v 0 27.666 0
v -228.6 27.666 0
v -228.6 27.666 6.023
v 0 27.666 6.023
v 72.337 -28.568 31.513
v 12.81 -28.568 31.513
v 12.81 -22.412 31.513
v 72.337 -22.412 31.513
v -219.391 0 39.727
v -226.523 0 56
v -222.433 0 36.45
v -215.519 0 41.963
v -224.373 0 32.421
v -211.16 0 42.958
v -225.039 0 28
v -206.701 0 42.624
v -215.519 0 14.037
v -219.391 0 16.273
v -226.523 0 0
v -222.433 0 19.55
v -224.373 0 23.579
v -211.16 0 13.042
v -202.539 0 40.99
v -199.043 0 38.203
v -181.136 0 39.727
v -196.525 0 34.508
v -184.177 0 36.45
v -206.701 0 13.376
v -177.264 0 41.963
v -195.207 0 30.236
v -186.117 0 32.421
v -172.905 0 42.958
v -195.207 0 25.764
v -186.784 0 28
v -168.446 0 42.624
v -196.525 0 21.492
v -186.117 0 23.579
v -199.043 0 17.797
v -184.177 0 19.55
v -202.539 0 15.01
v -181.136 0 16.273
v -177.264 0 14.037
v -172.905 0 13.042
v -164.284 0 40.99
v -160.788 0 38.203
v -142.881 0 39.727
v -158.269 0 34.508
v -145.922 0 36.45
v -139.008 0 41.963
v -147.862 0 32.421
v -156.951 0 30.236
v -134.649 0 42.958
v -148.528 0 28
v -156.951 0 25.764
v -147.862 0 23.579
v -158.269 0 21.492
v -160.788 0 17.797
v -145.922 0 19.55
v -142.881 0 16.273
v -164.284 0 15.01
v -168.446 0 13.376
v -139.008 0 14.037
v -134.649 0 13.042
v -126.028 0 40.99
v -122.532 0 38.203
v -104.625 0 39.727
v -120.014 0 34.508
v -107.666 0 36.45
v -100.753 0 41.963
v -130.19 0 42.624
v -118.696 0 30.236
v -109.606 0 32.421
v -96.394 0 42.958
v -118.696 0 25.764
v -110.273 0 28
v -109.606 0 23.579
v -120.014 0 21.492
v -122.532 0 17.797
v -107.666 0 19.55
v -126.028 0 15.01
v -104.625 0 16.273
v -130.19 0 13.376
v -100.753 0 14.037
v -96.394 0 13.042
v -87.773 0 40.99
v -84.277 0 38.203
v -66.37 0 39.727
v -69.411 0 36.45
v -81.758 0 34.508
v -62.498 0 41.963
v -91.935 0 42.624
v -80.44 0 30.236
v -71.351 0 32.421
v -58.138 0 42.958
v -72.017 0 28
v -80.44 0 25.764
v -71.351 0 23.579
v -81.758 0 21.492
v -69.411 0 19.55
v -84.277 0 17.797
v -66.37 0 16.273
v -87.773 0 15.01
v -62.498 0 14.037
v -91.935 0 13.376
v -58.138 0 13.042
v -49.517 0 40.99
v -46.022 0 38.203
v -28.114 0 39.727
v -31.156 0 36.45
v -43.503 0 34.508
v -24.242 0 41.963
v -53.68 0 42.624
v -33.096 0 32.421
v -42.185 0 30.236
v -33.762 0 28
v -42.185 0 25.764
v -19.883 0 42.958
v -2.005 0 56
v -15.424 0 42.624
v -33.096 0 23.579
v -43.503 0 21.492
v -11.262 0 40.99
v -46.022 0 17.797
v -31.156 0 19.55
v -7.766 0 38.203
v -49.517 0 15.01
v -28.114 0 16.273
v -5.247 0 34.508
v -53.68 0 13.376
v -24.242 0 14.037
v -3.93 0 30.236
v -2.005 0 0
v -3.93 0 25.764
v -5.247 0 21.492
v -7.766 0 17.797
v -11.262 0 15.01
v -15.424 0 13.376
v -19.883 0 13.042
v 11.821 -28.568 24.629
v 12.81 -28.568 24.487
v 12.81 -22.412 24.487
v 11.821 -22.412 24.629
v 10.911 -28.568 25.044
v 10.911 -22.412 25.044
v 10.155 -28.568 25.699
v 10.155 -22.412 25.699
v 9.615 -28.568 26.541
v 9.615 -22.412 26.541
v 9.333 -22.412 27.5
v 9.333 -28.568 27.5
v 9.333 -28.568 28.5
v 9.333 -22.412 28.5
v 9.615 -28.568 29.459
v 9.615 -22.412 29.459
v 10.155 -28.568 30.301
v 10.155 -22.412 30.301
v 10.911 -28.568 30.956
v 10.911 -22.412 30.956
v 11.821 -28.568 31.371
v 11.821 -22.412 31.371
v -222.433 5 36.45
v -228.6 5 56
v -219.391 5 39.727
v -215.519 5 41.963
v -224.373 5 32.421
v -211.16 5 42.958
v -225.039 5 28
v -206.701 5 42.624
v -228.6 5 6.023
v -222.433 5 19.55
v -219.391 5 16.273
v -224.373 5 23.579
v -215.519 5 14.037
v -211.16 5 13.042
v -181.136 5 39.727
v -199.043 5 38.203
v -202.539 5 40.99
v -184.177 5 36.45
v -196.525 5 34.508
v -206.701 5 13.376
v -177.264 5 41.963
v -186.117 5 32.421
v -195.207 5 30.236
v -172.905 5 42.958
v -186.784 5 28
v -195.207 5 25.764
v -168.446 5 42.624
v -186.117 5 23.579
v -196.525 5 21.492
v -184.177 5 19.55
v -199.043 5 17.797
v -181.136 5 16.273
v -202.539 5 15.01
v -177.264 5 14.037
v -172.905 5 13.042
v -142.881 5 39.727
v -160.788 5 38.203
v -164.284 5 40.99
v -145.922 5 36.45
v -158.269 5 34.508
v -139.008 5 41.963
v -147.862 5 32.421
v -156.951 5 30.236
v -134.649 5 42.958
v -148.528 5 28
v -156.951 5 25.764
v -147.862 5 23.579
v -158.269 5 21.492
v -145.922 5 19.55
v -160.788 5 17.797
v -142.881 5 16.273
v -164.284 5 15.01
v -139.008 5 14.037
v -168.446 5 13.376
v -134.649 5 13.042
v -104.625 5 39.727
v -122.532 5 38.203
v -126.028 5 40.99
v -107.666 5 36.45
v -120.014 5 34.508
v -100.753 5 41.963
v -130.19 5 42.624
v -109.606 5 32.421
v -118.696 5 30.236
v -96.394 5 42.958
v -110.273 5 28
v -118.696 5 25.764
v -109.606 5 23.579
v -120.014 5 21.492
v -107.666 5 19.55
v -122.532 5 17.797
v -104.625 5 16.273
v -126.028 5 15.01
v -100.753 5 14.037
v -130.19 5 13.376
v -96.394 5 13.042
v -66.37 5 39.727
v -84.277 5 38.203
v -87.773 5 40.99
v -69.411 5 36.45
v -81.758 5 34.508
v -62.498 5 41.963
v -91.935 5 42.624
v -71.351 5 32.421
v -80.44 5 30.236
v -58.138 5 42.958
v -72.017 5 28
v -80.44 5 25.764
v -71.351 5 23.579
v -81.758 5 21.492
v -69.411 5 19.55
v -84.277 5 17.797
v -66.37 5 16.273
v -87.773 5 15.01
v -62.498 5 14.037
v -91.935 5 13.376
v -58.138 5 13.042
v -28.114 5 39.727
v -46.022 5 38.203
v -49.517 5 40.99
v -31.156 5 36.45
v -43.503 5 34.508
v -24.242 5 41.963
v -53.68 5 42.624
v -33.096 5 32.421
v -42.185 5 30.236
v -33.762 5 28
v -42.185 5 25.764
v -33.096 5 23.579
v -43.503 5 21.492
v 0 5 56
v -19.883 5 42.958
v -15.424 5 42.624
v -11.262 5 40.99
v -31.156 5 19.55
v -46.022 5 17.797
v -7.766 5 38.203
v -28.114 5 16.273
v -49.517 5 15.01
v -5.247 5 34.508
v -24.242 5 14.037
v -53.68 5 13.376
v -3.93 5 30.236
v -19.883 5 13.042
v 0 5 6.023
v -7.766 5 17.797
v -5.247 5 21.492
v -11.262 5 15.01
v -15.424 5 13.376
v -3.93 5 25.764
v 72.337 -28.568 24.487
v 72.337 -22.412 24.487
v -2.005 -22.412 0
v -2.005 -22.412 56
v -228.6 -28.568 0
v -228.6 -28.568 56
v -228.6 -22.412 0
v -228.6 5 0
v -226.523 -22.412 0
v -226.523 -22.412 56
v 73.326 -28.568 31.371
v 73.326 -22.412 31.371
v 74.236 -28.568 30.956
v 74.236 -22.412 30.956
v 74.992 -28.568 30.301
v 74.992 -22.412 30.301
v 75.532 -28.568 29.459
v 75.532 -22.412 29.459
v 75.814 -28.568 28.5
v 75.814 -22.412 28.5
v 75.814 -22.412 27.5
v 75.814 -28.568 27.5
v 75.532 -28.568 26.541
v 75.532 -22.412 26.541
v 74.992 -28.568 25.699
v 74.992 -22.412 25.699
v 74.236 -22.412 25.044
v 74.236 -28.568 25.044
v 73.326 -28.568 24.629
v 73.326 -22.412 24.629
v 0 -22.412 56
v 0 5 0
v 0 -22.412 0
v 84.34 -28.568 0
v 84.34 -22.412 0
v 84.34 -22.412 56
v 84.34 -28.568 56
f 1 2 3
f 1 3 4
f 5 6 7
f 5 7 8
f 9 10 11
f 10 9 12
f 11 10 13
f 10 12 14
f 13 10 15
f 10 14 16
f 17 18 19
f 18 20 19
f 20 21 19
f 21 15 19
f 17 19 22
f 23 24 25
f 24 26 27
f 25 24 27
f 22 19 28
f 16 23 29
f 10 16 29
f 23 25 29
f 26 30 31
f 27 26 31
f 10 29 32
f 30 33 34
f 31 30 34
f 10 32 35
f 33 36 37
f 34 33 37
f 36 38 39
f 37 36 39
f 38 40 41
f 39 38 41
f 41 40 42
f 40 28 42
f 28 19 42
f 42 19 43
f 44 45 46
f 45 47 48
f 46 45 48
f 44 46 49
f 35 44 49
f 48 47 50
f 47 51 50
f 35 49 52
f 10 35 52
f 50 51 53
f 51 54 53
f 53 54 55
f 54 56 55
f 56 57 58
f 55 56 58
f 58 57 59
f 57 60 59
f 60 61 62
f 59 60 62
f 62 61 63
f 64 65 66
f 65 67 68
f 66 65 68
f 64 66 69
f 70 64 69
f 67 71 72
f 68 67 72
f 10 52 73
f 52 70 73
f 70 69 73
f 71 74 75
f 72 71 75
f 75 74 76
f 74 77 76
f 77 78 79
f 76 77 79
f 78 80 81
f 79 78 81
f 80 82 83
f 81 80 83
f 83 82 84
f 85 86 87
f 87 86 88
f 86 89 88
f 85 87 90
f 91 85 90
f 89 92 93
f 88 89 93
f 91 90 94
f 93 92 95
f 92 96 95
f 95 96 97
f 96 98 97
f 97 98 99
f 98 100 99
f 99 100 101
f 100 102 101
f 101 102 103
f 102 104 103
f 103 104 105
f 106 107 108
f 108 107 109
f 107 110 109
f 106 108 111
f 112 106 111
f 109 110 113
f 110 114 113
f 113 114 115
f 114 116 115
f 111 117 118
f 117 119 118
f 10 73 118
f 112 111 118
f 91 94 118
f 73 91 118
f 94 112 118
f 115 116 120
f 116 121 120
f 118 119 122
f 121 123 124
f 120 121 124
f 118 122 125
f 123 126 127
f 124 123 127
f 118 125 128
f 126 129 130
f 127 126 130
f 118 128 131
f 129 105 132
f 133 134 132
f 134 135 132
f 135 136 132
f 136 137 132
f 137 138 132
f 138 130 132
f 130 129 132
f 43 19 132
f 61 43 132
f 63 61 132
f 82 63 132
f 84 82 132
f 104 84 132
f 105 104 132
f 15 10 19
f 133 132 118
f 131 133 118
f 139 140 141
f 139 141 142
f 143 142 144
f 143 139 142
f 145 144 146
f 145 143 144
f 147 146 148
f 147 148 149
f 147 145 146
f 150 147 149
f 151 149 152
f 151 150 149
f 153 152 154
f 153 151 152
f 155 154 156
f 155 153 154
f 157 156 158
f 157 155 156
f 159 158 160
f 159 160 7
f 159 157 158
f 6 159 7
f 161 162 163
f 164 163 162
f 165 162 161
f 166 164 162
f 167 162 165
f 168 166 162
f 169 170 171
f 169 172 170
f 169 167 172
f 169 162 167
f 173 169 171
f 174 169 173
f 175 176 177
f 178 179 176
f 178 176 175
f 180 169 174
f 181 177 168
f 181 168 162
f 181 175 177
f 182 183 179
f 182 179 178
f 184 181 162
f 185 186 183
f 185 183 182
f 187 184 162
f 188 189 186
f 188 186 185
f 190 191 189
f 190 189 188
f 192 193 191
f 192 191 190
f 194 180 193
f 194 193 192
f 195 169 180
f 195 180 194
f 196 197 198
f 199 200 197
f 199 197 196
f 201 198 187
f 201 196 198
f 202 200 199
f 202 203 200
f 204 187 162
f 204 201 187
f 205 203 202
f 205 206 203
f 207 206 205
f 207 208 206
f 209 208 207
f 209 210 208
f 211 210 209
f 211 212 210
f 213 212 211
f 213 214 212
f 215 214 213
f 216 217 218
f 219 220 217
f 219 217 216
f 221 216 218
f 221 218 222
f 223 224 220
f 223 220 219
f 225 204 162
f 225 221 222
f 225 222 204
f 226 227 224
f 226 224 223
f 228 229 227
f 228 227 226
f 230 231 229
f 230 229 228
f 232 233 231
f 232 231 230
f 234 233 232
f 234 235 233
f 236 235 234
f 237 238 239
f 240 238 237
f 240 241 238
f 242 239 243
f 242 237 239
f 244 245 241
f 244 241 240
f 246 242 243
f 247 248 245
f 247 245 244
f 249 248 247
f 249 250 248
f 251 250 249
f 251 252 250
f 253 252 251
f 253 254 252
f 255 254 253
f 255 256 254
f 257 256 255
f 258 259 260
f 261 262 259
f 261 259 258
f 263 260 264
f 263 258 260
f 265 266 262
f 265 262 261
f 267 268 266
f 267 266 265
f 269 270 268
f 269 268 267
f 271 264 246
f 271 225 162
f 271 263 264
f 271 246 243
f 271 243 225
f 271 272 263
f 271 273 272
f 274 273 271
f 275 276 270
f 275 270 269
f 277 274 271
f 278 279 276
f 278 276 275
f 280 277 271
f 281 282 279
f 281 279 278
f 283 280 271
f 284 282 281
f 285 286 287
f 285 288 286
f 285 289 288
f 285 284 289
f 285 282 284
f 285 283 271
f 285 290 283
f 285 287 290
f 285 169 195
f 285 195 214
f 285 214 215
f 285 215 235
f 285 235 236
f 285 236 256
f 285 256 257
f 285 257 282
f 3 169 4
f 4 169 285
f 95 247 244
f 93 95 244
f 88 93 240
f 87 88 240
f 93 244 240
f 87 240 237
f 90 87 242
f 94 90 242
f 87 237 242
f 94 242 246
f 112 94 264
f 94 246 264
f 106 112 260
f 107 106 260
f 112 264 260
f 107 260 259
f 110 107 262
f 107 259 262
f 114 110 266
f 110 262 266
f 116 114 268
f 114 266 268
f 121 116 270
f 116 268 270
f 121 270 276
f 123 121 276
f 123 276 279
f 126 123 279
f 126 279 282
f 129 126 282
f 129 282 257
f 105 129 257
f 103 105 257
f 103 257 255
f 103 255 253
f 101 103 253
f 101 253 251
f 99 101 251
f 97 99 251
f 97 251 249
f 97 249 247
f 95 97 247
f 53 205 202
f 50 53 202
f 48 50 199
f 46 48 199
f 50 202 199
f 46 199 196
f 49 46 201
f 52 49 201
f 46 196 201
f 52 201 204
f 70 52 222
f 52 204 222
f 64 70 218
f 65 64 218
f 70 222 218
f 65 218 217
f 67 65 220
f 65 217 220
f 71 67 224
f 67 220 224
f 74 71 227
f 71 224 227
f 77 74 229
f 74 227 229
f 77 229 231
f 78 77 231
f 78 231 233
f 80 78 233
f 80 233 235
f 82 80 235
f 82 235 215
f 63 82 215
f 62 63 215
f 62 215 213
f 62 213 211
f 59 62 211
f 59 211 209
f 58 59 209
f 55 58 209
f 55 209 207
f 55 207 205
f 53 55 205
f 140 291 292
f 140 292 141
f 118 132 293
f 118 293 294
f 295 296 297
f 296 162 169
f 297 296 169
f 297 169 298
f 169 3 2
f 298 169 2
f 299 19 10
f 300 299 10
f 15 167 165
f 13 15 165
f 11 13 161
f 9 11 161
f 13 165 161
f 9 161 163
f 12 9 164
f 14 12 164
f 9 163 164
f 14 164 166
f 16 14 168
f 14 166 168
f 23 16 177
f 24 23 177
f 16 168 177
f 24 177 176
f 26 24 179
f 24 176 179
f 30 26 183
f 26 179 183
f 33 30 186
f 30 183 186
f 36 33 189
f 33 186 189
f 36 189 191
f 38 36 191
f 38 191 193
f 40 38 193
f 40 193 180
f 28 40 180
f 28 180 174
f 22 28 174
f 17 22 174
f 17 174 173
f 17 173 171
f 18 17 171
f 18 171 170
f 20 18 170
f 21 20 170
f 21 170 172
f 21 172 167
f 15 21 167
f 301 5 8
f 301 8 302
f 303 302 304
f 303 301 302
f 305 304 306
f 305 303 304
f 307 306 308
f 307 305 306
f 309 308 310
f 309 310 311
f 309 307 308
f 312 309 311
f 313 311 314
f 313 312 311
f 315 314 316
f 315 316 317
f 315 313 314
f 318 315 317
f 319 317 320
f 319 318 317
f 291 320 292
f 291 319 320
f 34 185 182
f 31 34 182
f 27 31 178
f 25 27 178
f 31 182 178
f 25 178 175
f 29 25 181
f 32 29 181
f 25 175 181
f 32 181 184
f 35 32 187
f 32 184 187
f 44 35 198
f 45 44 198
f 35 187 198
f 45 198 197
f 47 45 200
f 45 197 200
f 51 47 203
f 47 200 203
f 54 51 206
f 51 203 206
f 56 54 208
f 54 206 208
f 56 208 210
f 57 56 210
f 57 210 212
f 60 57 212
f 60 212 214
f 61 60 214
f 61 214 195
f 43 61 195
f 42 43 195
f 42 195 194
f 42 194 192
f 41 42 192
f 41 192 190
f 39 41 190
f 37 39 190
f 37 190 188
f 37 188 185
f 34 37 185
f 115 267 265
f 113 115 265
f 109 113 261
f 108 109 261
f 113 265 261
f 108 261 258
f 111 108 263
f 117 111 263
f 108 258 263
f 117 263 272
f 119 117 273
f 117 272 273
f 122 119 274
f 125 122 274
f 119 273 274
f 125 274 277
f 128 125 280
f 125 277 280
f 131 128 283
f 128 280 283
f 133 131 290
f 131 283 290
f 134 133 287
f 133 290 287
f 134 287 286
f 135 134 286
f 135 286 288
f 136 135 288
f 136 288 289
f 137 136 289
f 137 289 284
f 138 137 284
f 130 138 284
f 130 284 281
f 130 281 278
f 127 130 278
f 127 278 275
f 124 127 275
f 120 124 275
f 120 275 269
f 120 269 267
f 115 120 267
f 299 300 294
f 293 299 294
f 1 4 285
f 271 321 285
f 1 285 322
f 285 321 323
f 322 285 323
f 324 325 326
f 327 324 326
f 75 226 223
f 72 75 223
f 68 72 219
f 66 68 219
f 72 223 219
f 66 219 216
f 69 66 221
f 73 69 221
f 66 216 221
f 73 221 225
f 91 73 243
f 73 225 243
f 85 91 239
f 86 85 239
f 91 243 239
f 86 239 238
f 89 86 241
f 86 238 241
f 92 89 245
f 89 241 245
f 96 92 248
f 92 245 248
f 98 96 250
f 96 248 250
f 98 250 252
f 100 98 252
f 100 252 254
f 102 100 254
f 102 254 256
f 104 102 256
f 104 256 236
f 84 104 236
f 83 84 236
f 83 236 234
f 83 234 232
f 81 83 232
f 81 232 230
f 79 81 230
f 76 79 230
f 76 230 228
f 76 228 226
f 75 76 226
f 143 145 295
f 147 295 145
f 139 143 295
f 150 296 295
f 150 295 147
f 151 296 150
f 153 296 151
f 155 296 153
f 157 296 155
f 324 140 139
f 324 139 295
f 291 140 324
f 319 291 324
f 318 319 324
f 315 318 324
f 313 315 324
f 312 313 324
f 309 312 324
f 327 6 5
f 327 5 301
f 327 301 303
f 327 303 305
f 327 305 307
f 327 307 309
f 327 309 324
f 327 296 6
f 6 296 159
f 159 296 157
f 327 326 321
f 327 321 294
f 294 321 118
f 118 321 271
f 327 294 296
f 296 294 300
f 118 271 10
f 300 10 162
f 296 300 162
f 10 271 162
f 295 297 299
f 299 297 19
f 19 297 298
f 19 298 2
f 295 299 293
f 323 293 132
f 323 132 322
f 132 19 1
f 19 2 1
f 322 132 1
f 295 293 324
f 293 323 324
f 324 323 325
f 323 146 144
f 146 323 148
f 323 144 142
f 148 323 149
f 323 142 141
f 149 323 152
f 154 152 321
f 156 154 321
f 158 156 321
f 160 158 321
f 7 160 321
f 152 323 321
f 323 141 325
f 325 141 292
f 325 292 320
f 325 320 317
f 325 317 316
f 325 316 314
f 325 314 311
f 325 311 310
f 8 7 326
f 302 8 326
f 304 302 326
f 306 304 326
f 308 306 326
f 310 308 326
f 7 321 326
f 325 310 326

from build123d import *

# Parameters (mm, degrees)
SKETCH_1_W          = 228.6
SKETCH_1_H          = 5
EXTRUDE_1_DEPTH     = 55.99999976
SKETCH_2_R          = 15
CUT_EXTRUDE_1_DEPTH = 28
SKETCH_3_W          = 228.6
SKETCH_3_H          = 6.022861395
EXTRUDE_2_DEPTH     = 22.666
SKETCH_4_W          = 2.077402036
SKETCH_4_H          = 55.99999976
SKETCH_4_W_2        = 2.004864202
EXTRUDE_3_DEPTH     = 22.412
EXTRUDE_4_DEPTH     = 6.156
CUT_EXTRUDE_2_DEPTH = 6.156


with BuildPart() as part:
    # 草图1 → 凸台-拉伸1 (new body)
    with BuildSketch(Plane.XY):
        with Locations((-114.3, 2.5)):
            Rectangle(SKETCH_1_W, SKETCH_1_H)
    extrude(amount=EXTRUDE_1_DEPTH)

    # 草图2 → 切除-拉伸1 (cut)
    with BuildSketch(Plane(origin=(0, 5, 0), x_dir=(1, 0, 0), z_dir=(0, 1, 0))):
        with Locations(Location((-210.039051384, -27.99999988, 0), (0, 0, 180))):
            Circle(SKETCH_2_R)
        with Locations(Location((-171.783646654, -27.99999988, 0), (0, 0, 180))):
            Circle(SKETCH_2_R)
        with Locations(Location((-133.528241924, -27.99999988, 0), (0, 0, 180))):
            Circle(SKETCH_2_R)
        with Locations(Location((-95.272837194, -27.99999988, 0), (0, 0, 180))):
            Circle(SKETCH_2_R)
        with Locations(Location((-57.017432464, -27.99999988, 0), (0, 0, 180))):
            Circle(SKETCH_2_R)
        with Locations(Location((-18.762027734, -27.99999988, 0), (0, 0, 180))):
            Circle(SKETCH_2_R)
    extrude(amount=-CUT_EXTRUDE_1_DEPTH, mode=Mode.SUBTRACT)

    # 草图3 → 凸台-拉伸2 (add)
    with BuildSketch(Plane(origin=(0, 5, 0), x_dir=(1, 0, 0), z_dir=(0, 1, 0))):
        with Locations((-114.3, -3.011430698)):
            Rectangle(SKETCH_3_W, SKETCH_3_H)
    extrude(amount=EXTRUDE_2_DEPTH)

    # 草图4 → 凸台-拉伸3 (add)
    with BuildSketch(Plane.XZ):
        with Locations((-227.561298982, 27.99999988)):
            Rectangle(SKETCH_4_W, SKETCH_4_H)
        with Locations((-1.002432101, 27.99999988)):
            Rectangle(SKETCH_4_W_2, SKETCH_4_H)
    extrude(amount=EXTRUDE_3_DEPTH)

    # 草图5 → 凸台-拉伸4 (add)
    with BuildSketch(Plane.XZ.offset(22.412)):
        Polygon((-228.6, 55.99999976), (-228.6, 0), (-226.522597964, 0), (84.340152487, 0), (84.340152487, 55.99999976), (-226.522597964, 55.99999976), align=None)
    extrude(amount=EXTRUDE_4_DEPTH)

    # 草图7 → 切除-拉伸2 (cut)
    with BuildSketch(Plane.XZ.offset(28.568)):
        with BuildLine():
            Line((12.810419977, 31.513278328), (72.336600875, 31.513278328))
            ThreePointArc((72.336600875, 31.513278328), (75.849879323, 27.99999988), (72.336600875, 24.486721432))
            Line((72.336600875, 24.486721432), (12.810419977, 24.486721432))
            ThreePointArc((12.810419977, 24.486721432), (9.297141529, 27.99999988), (12.810419977, 31.513278328))
        make_face()
    extrude(amount=-CUT_EXTRUDE_2_DEPTH, mode=Mode.SUBTRACT)


solid = part.part
